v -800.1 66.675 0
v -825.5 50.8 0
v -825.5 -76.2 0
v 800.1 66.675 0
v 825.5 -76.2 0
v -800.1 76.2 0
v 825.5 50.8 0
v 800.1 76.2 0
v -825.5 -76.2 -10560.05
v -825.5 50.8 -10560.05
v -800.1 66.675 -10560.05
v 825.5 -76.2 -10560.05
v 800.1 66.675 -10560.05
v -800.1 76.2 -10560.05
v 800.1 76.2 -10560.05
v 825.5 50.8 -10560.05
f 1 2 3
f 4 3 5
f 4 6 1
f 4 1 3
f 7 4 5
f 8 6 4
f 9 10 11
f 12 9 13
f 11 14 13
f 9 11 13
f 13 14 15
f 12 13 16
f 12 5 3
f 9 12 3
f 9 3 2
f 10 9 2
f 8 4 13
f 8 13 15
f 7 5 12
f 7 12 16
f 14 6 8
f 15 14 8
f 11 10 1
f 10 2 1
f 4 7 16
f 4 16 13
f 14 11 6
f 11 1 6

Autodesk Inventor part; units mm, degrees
ref_plane "YZ Plane" through (0, 0, 0) normal (1, 0, 0) x (0, 1, 0)
ref_plane "XZ Plane" through (0, 0, 0) normal (0, 1, 0) x (-1, 0, 0)
ref_plane "XY Plane" through (0, 0, 0) normal (0, 0, 1) x (1, 0, 0)
sketch "Sketch1" plane through (0, 0, 0) normal (0, 0, 1) x (1, 0, 0)
  line L0 (838.2, -76.2) -> (-838.2, -76.2)
  line L1 (-838.2, -76.2) -> (-838.2, 76.2)
  line L2 (-838.2, 76.2) -> (838.2, 76.2)
  line L3 (838.2, 76.2) -> (838.2, -76.2)
  line L4 (838.2, -76.2) -> (-838.2, 76.2) construction
  line L5 (-838.2, -76.2) -> (838.2, 76.2) construction
  point P0 (0, 0)
  dimension "d0" = 152.4
  dimension "d1" = 1676.4
extrude "Extrusion1" add sketch "Sketch1" against normal blind 10560.05
sketch "Sketch2" plane through (0, 0, 0) normal (0, 0, 1) x (1, 0, 0)
  line L0 (838.2, -76.2) -> (-838.2, -76.2) projected
  line L1 (825.5, -76.2) -> (825.5, 50.8)
  line L2 (825.5, 50.8) -> (800.1, 66.675)
  line L3 (800.1, 66.675) -> (800.1, 76.2)
  line L4 (-838.2, 76.2) -> (838.2, 76.2) projected
  line L5 (800.1, 76.2) -> (838.2, 76.2)
  line L6 (838.2, 76.2) -> (838.2, -76.2)
  line L7 (825.5, -76.2) -> (838.2, -76.2)
  line L8 (0, 76.2) -> (0, -76.2) construction
  line L9 (-838.2, -76.2) -> (838.2, -76.2)
  line L10 (-825.5, -76.2) -> (-825.5, 50.8)
  line L11 (-825.5, 50.8) -> (-800.1, 66.675)
  line L12 (-800.1, 66.675) -> (-800.1, 76.2)
  line L13 (838.2, 76.2) -> (-838.2, 76.2)
  line L14 (-800.1, 76.2) -> (-838.2, 76.2)
  line L15 (-838.2, 76.2) -> (-838.2, -76.2)
  line L16 (-825.5, -76.2) -> (-838.2, -76.2)
  point P0 (0, 0)
  dimension "d4" = 12.7
  dimension "d5" = 25.4
  dimension "d6" = 15.875
  dimension "d7" = 127
extrude "Extrusion2" cut sketch "Sketch2" against normal through all contours L0 L1 L2 L3 L4 L6 | L0 L15 L4 L12 L11 L10
properties part number "Concrete Walkway" material "Concrete"
